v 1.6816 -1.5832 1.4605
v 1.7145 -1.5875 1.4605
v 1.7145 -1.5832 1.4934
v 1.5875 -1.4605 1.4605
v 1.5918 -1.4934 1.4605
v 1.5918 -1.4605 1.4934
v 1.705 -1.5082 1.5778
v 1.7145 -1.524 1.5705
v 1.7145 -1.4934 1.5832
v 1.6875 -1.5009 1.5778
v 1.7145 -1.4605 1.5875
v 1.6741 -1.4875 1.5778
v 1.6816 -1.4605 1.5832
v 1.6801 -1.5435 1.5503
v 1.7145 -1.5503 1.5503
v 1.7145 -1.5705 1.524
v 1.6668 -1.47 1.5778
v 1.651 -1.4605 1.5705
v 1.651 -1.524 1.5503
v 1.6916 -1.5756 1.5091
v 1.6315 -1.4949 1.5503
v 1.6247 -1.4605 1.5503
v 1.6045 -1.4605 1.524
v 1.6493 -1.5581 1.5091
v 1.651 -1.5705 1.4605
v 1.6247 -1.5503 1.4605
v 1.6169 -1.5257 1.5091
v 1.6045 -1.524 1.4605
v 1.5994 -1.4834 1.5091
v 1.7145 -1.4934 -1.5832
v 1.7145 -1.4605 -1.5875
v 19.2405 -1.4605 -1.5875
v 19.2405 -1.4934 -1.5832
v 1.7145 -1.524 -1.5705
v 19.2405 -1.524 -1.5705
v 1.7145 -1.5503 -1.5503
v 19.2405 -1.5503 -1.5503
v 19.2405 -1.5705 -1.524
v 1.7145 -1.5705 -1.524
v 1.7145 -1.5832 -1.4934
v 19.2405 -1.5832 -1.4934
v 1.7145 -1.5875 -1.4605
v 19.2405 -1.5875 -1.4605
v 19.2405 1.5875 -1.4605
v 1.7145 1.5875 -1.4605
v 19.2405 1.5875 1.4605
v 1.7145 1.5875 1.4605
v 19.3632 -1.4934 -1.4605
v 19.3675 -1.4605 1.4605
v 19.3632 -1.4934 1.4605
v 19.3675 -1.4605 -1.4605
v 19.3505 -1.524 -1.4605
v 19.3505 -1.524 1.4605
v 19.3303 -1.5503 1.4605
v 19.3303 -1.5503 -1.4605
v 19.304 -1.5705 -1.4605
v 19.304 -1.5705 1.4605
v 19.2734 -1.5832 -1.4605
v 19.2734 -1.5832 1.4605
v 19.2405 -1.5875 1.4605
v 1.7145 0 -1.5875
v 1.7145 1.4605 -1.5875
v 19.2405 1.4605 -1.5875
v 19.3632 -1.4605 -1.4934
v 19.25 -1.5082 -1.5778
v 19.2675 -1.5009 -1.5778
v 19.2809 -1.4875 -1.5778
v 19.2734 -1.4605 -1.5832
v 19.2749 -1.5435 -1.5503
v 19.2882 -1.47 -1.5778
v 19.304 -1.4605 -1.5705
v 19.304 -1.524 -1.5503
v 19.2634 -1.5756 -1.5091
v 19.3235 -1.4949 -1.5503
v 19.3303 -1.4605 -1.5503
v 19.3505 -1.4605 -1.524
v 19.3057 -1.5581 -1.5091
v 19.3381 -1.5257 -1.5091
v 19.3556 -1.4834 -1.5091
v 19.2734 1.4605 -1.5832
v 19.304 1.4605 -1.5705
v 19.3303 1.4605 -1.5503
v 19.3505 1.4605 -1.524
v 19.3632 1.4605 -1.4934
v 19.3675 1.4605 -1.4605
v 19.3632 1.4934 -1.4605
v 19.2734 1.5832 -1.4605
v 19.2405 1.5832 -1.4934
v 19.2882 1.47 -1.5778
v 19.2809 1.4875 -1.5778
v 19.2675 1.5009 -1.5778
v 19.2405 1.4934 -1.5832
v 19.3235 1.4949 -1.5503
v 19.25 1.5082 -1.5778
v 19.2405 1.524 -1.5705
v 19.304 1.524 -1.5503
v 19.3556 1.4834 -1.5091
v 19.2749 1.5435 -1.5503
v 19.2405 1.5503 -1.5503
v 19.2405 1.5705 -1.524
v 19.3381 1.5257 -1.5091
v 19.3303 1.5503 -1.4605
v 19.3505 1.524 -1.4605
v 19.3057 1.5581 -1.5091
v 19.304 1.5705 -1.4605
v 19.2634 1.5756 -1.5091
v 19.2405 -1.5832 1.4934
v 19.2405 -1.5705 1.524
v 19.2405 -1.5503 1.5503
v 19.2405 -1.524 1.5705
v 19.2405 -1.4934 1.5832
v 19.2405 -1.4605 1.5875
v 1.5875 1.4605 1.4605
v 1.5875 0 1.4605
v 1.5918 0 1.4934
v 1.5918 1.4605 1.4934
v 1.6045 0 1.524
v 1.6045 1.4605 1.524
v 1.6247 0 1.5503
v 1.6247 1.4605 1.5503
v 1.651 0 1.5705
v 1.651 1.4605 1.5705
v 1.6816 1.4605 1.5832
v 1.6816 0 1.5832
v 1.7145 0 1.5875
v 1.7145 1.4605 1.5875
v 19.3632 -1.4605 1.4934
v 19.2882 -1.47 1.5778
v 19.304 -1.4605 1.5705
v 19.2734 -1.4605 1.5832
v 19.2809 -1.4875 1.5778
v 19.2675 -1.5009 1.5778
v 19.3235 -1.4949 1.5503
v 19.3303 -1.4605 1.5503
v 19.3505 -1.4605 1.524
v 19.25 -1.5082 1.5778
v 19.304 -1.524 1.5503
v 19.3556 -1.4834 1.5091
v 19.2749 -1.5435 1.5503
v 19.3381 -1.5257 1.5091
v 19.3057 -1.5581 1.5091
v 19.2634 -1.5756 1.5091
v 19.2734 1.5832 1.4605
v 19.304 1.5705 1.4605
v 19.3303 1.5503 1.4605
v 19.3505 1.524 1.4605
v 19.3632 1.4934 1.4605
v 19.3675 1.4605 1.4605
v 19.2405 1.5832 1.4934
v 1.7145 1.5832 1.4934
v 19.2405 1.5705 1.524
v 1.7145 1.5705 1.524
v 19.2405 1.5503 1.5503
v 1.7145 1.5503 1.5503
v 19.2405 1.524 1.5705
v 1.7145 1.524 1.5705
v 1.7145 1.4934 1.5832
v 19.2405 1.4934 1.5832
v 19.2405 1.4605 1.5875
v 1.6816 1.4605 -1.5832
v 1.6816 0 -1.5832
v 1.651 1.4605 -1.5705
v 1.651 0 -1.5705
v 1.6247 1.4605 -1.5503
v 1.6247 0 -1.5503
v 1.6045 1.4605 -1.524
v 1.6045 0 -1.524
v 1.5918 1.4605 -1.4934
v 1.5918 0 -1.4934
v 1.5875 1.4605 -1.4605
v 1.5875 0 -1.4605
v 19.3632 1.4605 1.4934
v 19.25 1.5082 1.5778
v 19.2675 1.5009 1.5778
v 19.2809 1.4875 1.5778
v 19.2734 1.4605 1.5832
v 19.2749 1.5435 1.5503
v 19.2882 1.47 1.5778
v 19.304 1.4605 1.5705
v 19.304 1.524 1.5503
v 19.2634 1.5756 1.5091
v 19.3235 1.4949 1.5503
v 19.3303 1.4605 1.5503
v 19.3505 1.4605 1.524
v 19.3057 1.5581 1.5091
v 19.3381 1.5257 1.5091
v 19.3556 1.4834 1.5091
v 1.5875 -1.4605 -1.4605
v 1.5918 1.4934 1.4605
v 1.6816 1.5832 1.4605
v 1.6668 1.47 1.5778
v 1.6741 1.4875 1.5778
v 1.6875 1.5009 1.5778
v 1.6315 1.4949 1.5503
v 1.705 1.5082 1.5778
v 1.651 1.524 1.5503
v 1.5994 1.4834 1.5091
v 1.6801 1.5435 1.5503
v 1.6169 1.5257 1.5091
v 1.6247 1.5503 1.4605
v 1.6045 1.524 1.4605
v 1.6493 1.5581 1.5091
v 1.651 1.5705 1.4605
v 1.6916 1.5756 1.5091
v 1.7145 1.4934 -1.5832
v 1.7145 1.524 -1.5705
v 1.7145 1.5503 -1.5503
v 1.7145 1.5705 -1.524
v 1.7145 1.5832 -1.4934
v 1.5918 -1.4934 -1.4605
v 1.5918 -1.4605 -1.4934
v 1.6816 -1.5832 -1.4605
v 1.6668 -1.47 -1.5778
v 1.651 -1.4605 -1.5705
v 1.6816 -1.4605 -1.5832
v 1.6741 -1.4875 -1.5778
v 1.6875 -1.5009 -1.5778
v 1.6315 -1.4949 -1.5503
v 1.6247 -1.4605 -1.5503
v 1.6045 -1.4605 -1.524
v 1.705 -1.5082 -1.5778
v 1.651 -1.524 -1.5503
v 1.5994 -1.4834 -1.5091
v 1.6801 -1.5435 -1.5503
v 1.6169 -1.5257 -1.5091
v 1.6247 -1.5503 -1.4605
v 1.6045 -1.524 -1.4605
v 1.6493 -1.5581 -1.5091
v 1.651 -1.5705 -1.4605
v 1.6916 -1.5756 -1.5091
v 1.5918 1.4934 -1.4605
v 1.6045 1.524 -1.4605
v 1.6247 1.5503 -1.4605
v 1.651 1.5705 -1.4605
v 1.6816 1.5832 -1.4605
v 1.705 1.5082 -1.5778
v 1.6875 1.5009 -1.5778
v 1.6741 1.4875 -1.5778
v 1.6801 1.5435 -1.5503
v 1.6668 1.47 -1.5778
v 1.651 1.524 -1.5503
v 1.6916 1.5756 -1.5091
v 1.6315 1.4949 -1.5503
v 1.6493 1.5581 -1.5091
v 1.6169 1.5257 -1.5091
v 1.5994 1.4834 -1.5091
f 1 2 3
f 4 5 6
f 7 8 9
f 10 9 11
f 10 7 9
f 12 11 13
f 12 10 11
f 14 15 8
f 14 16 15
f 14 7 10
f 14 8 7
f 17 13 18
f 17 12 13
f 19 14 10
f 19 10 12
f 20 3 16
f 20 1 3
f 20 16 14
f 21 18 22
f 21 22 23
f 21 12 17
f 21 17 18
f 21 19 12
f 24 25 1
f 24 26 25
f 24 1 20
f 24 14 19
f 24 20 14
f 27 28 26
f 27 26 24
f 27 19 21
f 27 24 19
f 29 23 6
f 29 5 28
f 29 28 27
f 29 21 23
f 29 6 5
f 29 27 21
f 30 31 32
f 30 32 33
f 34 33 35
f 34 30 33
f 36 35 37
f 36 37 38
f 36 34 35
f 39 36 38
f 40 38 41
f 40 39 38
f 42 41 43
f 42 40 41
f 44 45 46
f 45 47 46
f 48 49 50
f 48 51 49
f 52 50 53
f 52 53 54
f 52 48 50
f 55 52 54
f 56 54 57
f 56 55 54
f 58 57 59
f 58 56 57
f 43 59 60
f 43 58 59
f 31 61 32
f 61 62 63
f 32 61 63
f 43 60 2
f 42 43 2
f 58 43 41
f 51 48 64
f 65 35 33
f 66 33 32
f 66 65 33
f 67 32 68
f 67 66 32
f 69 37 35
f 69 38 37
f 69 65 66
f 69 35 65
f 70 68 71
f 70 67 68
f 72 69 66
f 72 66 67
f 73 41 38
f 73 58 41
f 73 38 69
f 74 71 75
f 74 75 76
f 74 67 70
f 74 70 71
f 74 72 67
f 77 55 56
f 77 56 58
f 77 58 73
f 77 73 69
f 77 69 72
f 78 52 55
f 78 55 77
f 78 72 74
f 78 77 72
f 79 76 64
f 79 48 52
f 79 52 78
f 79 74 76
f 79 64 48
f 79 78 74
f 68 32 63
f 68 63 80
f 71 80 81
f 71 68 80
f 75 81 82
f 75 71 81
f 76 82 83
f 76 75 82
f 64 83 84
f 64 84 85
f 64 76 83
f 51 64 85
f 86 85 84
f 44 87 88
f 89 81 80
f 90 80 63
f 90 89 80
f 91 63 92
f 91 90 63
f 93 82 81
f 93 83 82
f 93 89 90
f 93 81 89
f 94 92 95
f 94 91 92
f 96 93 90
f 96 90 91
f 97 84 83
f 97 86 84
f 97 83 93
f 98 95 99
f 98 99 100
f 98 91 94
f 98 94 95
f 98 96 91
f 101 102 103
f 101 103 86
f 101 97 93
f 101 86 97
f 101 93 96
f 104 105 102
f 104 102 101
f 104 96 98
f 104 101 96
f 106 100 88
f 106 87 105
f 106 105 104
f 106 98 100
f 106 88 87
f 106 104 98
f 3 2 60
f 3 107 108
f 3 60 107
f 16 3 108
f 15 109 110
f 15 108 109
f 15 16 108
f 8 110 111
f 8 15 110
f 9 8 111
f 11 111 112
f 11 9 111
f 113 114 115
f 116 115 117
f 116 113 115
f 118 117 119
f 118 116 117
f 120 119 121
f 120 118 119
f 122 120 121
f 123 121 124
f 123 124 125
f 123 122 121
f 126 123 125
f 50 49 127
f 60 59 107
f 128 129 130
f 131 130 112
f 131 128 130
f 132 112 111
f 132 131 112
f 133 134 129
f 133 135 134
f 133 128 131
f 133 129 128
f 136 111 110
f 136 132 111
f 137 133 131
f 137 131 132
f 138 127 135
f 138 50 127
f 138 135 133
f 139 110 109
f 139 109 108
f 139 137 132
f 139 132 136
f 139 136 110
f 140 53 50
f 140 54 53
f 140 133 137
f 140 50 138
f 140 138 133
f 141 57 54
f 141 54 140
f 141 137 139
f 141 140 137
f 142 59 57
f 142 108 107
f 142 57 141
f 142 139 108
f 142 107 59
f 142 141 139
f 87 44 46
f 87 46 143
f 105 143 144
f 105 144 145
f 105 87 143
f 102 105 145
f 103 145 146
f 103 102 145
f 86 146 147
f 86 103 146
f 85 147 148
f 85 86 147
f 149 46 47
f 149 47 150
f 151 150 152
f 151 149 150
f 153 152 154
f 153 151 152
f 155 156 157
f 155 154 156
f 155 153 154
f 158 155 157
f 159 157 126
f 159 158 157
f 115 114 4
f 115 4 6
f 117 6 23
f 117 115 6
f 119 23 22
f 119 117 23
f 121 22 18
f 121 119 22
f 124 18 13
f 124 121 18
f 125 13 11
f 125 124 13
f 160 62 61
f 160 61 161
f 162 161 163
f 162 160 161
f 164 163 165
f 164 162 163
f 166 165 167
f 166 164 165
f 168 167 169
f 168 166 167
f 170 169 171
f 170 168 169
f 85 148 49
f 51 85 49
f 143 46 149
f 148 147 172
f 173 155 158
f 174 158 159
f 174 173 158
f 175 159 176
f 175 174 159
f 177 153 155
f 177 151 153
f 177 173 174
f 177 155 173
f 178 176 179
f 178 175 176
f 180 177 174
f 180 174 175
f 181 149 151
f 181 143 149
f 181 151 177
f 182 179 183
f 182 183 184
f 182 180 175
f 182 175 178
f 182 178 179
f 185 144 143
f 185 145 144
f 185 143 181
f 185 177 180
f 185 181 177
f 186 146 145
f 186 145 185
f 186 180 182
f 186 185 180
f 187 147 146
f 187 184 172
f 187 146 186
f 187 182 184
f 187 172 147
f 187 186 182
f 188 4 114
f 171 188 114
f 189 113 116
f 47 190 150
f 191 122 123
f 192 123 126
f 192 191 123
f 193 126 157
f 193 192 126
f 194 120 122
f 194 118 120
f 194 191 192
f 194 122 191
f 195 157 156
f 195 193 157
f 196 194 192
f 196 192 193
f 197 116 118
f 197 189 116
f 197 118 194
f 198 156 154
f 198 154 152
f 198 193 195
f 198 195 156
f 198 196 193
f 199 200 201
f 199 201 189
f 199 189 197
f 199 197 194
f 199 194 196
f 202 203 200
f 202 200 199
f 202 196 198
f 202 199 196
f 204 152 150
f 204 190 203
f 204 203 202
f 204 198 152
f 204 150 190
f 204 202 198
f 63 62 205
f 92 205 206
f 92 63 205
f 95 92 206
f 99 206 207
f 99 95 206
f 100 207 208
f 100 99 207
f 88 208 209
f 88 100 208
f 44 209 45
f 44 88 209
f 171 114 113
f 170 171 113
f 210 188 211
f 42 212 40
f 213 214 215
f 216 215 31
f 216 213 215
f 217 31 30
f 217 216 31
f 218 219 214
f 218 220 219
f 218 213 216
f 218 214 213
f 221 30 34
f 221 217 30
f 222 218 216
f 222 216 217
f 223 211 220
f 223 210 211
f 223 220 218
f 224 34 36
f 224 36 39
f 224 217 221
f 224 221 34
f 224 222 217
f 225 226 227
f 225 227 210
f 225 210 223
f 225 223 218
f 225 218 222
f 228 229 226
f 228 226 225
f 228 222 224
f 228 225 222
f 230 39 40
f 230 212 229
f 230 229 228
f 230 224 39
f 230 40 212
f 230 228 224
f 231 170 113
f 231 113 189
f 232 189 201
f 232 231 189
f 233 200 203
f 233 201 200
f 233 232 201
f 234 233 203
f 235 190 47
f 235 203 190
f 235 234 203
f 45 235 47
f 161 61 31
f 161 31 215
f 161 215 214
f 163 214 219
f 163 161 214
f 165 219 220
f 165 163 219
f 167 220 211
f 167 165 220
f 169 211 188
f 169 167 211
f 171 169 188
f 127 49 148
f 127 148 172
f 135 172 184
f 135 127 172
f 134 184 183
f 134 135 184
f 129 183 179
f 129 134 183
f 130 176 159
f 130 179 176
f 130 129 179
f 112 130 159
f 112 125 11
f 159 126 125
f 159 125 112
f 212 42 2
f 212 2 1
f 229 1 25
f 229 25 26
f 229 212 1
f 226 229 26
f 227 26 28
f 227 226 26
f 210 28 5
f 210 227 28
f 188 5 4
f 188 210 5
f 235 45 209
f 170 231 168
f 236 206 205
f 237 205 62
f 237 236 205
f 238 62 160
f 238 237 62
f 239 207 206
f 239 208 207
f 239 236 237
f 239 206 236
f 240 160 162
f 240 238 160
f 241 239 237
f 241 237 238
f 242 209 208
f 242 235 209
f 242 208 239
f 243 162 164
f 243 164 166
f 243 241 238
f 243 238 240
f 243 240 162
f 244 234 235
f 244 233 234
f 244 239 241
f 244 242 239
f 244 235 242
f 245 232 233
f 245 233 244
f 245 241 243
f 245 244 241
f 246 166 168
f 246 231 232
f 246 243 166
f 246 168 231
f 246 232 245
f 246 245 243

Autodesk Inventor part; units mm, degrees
ref_plane "YZ Plane" through (0, 0, 0) normal (1, 0, 0) x (0, 1, 0)
sketch "Sketch1" plane through (0, 0, 0) normal (0, 0, 1) x (1, 0, 0)
  line L0 (1.5875, 1.5875) -> (19.3675, 1.5875)
  line L1 (19.3675, 1.5875) -> (19.3675, -1.5875)
  line L2 (19.3675, -1.5875) -> (1.5875, -1.5875)
  line L3 (1.5875, -1.5875) -> (1.5875, 1.5875)
  arc A0 (1.5875, 1.5875) -> (1.5875, -1.5875) centre (1.5875, 0) ccw construction
  line L4 (0, 2.2225) -> (0, -2.2225) projected
  line L5 (-2.3175, 0) -> (13.905, 0) projected
  dimension "d0" = 1.5875
  dimension "d1" = 17.78
ref_plane "IDS_WORKPLANE{1}" through (0, 0, -1.5875) normal (0, 0, 1) x (1, 0, 0)
ref_plane "IDS_WORKPLANE{2}" through (0, 0, 1.5875) normal (0, 0, 1) x (1, 0, 0)
extrude "Body1" add sketch "Sketch1" against normal up to surface (3.175 mm away) from surface at 1.5875
fillet "Fillet1" radius 0.127 14 edges at (1.5875, 1.5875, 0) (19.3675, 1.5875, 0) (10.4775, 1.5875, 1.5875) (10.4775, 1.5875, -1.5875) (19.3675, -1.5875, 0) (19.3675, 0, 1.5875) (19.3675, 0, -1.5875) (1.5875, -1.5875, 0) (10.4775, -1.5875, 1.5875) (10.4775, -1.5875, -1.5875) (1.5875, -0.7937, 1.5875) (1.5875, -0.7937, -1.5875) (1.5875, 0.7937, 1.5875) (1.5875, 0.7937, -1.5875)
equation "\"d0\" = 0.5 * PB"
equation "\"d1\" = NLG"
equation "\"d2\" = -PNT"
equation "\"d3\" = PB - PNT"
equation "\"NLG\" = 17.78"
equation "\"PB\" = 3.175"
equation "\"PNT\" = 1.5875"
properties part number "am-1043" material "Steel, Mild"
